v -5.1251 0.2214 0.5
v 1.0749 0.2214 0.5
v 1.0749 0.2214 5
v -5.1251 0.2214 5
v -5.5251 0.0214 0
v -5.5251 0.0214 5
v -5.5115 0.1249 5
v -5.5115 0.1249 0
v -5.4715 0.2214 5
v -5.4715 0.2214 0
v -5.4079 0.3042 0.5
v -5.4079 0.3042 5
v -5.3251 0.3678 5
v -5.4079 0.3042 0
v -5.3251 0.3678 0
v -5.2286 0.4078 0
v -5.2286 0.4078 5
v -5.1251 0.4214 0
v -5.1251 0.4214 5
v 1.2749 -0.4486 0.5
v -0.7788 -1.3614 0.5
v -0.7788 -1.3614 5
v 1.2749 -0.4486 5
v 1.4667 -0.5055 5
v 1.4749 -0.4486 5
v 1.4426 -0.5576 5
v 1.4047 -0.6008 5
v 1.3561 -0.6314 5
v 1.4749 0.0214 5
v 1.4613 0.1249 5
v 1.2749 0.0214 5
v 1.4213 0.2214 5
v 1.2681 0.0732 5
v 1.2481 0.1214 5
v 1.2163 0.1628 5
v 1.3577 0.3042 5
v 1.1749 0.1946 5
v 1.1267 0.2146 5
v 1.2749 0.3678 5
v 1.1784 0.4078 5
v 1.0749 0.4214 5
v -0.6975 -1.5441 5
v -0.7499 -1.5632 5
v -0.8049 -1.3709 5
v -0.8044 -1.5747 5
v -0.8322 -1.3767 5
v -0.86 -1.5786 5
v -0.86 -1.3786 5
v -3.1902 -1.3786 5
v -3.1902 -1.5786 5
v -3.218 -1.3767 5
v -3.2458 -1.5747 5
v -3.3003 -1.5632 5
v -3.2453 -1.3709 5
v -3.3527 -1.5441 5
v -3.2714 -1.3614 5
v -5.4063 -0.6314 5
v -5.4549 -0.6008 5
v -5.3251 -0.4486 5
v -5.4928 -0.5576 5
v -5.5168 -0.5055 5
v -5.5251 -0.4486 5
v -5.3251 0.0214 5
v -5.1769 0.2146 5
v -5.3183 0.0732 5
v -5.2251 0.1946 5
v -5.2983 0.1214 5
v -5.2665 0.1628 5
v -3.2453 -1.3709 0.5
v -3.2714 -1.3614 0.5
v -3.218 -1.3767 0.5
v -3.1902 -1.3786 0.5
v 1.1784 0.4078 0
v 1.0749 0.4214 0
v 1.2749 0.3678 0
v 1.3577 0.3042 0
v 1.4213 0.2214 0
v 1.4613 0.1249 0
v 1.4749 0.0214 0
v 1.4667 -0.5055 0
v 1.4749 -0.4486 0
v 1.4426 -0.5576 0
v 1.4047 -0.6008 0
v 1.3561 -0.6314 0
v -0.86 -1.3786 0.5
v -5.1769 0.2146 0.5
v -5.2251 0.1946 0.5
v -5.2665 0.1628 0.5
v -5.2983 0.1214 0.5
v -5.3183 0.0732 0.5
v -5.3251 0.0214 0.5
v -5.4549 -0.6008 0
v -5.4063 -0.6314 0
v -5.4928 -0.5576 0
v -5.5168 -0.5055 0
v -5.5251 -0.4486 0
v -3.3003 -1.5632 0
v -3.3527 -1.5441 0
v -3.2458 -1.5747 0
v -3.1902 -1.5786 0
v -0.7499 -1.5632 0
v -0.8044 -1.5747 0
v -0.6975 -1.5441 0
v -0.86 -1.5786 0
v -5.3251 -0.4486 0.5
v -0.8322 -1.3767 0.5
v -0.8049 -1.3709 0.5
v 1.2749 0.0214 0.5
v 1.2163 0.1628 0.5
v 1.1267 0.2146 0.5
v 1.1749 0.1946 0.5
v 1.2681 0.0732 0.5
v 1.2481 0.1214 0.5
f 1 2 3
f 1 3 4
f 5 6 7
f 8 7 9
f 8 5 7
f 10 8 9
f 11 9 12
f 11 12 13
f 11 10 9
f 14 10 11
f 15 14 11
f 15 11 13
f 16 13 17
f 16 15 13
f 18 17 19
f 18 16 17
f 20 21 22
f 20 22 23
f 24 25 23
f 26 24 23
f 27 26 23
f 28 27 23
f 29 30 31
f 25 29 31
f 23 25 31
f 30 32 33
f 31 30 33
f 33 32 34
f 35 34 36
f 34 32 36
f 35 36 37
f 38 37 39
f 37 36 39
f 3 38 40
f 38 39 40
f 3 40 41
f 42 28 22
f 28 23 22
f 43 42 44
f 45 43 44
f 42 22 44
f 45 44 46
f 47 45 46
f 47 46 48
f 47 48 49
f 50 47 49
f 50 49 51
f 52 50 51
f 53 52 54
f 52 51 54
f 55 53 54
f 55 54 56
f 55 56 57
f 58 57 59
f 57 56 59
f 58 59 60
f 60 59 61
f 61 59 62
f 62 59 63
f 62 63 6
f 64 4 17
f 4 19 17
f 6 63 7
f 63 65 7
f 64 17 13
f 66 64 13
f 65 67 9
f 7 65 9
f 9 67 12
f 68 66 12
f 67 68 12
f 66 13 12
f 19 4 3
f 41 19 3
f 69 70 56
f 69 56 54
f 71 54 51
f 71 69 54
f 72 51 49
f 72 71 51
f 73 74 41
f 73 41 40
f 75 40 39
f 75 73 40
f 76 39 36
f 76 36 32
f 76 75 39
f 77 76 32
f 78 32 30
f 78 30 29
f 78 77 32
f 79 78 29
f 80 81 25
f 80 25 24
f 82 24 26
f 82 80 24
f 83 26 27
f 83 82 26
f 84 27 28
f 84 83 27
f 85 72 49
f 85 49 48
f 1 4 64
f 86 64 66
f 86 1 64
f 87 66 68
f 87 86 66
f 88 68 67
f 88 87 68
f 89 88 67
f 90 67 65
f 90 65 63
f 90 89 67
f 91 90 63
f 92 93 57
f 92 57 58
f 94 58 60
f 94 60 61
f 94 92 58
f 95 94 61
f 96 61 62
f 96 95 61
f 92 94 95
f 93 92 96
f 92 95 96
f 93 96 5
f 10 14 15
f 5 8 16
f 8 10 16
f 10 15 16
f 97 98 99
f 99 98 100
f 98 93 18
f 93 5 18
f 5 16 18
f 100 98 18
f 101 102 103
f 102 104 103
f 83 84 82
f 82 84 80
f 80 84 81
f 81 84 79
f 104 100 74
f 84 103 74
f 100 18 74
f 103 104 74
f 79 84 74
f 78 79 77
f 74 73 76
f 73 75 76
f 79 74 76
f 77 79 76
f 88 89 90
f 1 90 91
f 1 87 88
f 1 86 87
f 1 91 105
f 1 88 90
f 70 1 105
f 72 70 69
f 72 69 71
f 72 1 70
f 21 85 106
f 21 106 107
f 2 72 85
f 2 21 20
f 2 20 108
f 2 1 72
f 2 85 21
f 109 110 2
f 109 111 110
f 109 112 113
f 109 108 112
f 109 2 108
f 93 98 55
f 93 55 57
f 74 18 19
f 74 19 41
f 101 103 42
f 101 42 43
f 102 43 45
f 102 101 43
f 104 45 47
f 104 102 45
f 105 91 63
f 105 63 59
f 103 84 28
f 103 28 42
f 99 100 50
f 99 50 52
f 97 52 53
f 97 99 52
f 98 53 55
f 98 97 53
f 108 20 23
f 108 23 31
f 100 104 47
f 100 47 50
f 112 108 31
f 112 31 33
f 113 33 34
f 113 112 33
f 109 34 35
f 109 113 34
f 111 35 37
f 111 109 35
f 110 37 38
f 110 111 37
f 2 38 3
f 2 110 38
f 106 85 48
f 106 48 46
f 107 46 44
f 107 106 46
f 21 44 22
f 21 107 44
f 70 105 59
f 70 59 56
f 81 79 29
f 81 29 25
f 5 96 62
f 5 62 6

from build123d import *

# Parameters (mm, degrees)
BOSS_EXTRUDE2_DEPTH = 5
BOSS_EXTRUDE3_DEPTH = 0.5


with BuildPart() as part:
    # Sketch1 → Boss-Extrude2 (new body)
    with BuildSketch(Plane.XY):
        with BuildLine():
            Line((-5.525095111, -0.448623985), (-5.525095111, 0.021401397))
            ThreePointArc((-5.525095111, 0.021401397), (-5.407937823, 0.304244109), (-5.125095111, 0.421401397))
            Line((-5.125095111, 0.421401397), (1.074904889, 0.421401397))
            ThreePointArc((1.074904889, 0.421401397), (1.357747601, 0.304244109), (1.474904889, 0.021401397))
            Line((1.474904889, 0.021401397), (1.474904889, -0.448623985))
            ThreePointArc((1.474904889, -0.448623985), (1.442603337, -0.557606693), (1.356132582, -0.631386295))
            Line((1.356132582, -0.631386295), (-0.697525505, -1.544123223))
            ThreePointArc((-0.697525505, -1.544123223), (-0.776944296, -1.569884846), (-0.859980891, -1.578598603))
            Line((-0.859980891, -1.578598603), (-3.190209331, -1.578598603))
            ThreePointArc((-3.190209331, -1.578598603), (-3.273245926, -1.569884846), (-3.352664717, -1.544123223))
            Line((-3.352664717, -1.544123223), (-5.406322804, -0.631386295))
            ThreePointArc((-5.406322804, -0.631386295), (-5.492793559, -0.557606693), (-5.525095111, -0.448623985))
        make_face()
        with BuildLine():
            Line((-0.778753198, -1.361360913), (1.274904889, -0.448623985))
            Line((1.274904889, -0.448623985), (1.274904889, 0.021401397))
            ThreePointArc((1.274904889, 0.021401397), (1.216326245, 0.162822753), (1.074904889, 0.221401397))
            Line((1.074904889, 0.221401397), (-5.125095111, 0.221401397))
            ThreePointArc((-5.125095111, 0.221401397), (-5.266516467, 0.162822753), (-5.325095111, 0.021401397))
            Line((-5.325095111, 0.021401397), (-5.325095111, -0.448623985))
            Line((-5.325095111, -0.448623985), (-3.271437024, -1.361360913))
            ThreePointArc((-3.271437024, -1.361360913), (-3.231727628, -1.374241725), (-3.190209331, -1.378598603))
            Line((-3.190209331, -1.378598603), (-0.859980891, -1.378598603))
            ThreePointArc((-0.859980891, -1.378598603), (-0.818462594, -1.374241725), (-0.778753198, -1.361360913))
        make_face(mode=Mode.SUBTRACT)
    extrude(amount=BOSS_EXTRUDE2_DEPTH)

    # Sketch2 → Boss-Extrude3 (add)
    with BuildSketch(Plane.XY):
        with BuildLine():
            Line((-3.190209331, -1.378598603), (-0.859980891, -1.378598603))
            ThreePointArc((-0.859980891, -1.378598603), (-0.818462594, -1.374241725), (-0.778753198, -1.361360913))
            Line((-0.778753198, -1.361360913), (1.274904889, -0.448623985))
            Line((1.274904889, -0.448623985), (1.274904889, 0.304244109))
            Line((1.274904889, 0.304244109), (-5.407937823, 0.304244109))
            Line((-5.407937823, 0.304244109), (-5.407937823, -0.448623985))
            Line((-5.407937823, -0.448623985), (-5.325095111, -0.448623985))
            Line((-5.325095111, -0.448623985), (-3.271437024, -1.361360913))
            ThreePointArc((-3.271437024, -1.361360913), (-3.231727628, -1.374241725), (-3.190209331, -1.378598603))
        make_face()
    extrude(amount=BOSS_EXTRUDE3_DEPTH)


solid = part.part
